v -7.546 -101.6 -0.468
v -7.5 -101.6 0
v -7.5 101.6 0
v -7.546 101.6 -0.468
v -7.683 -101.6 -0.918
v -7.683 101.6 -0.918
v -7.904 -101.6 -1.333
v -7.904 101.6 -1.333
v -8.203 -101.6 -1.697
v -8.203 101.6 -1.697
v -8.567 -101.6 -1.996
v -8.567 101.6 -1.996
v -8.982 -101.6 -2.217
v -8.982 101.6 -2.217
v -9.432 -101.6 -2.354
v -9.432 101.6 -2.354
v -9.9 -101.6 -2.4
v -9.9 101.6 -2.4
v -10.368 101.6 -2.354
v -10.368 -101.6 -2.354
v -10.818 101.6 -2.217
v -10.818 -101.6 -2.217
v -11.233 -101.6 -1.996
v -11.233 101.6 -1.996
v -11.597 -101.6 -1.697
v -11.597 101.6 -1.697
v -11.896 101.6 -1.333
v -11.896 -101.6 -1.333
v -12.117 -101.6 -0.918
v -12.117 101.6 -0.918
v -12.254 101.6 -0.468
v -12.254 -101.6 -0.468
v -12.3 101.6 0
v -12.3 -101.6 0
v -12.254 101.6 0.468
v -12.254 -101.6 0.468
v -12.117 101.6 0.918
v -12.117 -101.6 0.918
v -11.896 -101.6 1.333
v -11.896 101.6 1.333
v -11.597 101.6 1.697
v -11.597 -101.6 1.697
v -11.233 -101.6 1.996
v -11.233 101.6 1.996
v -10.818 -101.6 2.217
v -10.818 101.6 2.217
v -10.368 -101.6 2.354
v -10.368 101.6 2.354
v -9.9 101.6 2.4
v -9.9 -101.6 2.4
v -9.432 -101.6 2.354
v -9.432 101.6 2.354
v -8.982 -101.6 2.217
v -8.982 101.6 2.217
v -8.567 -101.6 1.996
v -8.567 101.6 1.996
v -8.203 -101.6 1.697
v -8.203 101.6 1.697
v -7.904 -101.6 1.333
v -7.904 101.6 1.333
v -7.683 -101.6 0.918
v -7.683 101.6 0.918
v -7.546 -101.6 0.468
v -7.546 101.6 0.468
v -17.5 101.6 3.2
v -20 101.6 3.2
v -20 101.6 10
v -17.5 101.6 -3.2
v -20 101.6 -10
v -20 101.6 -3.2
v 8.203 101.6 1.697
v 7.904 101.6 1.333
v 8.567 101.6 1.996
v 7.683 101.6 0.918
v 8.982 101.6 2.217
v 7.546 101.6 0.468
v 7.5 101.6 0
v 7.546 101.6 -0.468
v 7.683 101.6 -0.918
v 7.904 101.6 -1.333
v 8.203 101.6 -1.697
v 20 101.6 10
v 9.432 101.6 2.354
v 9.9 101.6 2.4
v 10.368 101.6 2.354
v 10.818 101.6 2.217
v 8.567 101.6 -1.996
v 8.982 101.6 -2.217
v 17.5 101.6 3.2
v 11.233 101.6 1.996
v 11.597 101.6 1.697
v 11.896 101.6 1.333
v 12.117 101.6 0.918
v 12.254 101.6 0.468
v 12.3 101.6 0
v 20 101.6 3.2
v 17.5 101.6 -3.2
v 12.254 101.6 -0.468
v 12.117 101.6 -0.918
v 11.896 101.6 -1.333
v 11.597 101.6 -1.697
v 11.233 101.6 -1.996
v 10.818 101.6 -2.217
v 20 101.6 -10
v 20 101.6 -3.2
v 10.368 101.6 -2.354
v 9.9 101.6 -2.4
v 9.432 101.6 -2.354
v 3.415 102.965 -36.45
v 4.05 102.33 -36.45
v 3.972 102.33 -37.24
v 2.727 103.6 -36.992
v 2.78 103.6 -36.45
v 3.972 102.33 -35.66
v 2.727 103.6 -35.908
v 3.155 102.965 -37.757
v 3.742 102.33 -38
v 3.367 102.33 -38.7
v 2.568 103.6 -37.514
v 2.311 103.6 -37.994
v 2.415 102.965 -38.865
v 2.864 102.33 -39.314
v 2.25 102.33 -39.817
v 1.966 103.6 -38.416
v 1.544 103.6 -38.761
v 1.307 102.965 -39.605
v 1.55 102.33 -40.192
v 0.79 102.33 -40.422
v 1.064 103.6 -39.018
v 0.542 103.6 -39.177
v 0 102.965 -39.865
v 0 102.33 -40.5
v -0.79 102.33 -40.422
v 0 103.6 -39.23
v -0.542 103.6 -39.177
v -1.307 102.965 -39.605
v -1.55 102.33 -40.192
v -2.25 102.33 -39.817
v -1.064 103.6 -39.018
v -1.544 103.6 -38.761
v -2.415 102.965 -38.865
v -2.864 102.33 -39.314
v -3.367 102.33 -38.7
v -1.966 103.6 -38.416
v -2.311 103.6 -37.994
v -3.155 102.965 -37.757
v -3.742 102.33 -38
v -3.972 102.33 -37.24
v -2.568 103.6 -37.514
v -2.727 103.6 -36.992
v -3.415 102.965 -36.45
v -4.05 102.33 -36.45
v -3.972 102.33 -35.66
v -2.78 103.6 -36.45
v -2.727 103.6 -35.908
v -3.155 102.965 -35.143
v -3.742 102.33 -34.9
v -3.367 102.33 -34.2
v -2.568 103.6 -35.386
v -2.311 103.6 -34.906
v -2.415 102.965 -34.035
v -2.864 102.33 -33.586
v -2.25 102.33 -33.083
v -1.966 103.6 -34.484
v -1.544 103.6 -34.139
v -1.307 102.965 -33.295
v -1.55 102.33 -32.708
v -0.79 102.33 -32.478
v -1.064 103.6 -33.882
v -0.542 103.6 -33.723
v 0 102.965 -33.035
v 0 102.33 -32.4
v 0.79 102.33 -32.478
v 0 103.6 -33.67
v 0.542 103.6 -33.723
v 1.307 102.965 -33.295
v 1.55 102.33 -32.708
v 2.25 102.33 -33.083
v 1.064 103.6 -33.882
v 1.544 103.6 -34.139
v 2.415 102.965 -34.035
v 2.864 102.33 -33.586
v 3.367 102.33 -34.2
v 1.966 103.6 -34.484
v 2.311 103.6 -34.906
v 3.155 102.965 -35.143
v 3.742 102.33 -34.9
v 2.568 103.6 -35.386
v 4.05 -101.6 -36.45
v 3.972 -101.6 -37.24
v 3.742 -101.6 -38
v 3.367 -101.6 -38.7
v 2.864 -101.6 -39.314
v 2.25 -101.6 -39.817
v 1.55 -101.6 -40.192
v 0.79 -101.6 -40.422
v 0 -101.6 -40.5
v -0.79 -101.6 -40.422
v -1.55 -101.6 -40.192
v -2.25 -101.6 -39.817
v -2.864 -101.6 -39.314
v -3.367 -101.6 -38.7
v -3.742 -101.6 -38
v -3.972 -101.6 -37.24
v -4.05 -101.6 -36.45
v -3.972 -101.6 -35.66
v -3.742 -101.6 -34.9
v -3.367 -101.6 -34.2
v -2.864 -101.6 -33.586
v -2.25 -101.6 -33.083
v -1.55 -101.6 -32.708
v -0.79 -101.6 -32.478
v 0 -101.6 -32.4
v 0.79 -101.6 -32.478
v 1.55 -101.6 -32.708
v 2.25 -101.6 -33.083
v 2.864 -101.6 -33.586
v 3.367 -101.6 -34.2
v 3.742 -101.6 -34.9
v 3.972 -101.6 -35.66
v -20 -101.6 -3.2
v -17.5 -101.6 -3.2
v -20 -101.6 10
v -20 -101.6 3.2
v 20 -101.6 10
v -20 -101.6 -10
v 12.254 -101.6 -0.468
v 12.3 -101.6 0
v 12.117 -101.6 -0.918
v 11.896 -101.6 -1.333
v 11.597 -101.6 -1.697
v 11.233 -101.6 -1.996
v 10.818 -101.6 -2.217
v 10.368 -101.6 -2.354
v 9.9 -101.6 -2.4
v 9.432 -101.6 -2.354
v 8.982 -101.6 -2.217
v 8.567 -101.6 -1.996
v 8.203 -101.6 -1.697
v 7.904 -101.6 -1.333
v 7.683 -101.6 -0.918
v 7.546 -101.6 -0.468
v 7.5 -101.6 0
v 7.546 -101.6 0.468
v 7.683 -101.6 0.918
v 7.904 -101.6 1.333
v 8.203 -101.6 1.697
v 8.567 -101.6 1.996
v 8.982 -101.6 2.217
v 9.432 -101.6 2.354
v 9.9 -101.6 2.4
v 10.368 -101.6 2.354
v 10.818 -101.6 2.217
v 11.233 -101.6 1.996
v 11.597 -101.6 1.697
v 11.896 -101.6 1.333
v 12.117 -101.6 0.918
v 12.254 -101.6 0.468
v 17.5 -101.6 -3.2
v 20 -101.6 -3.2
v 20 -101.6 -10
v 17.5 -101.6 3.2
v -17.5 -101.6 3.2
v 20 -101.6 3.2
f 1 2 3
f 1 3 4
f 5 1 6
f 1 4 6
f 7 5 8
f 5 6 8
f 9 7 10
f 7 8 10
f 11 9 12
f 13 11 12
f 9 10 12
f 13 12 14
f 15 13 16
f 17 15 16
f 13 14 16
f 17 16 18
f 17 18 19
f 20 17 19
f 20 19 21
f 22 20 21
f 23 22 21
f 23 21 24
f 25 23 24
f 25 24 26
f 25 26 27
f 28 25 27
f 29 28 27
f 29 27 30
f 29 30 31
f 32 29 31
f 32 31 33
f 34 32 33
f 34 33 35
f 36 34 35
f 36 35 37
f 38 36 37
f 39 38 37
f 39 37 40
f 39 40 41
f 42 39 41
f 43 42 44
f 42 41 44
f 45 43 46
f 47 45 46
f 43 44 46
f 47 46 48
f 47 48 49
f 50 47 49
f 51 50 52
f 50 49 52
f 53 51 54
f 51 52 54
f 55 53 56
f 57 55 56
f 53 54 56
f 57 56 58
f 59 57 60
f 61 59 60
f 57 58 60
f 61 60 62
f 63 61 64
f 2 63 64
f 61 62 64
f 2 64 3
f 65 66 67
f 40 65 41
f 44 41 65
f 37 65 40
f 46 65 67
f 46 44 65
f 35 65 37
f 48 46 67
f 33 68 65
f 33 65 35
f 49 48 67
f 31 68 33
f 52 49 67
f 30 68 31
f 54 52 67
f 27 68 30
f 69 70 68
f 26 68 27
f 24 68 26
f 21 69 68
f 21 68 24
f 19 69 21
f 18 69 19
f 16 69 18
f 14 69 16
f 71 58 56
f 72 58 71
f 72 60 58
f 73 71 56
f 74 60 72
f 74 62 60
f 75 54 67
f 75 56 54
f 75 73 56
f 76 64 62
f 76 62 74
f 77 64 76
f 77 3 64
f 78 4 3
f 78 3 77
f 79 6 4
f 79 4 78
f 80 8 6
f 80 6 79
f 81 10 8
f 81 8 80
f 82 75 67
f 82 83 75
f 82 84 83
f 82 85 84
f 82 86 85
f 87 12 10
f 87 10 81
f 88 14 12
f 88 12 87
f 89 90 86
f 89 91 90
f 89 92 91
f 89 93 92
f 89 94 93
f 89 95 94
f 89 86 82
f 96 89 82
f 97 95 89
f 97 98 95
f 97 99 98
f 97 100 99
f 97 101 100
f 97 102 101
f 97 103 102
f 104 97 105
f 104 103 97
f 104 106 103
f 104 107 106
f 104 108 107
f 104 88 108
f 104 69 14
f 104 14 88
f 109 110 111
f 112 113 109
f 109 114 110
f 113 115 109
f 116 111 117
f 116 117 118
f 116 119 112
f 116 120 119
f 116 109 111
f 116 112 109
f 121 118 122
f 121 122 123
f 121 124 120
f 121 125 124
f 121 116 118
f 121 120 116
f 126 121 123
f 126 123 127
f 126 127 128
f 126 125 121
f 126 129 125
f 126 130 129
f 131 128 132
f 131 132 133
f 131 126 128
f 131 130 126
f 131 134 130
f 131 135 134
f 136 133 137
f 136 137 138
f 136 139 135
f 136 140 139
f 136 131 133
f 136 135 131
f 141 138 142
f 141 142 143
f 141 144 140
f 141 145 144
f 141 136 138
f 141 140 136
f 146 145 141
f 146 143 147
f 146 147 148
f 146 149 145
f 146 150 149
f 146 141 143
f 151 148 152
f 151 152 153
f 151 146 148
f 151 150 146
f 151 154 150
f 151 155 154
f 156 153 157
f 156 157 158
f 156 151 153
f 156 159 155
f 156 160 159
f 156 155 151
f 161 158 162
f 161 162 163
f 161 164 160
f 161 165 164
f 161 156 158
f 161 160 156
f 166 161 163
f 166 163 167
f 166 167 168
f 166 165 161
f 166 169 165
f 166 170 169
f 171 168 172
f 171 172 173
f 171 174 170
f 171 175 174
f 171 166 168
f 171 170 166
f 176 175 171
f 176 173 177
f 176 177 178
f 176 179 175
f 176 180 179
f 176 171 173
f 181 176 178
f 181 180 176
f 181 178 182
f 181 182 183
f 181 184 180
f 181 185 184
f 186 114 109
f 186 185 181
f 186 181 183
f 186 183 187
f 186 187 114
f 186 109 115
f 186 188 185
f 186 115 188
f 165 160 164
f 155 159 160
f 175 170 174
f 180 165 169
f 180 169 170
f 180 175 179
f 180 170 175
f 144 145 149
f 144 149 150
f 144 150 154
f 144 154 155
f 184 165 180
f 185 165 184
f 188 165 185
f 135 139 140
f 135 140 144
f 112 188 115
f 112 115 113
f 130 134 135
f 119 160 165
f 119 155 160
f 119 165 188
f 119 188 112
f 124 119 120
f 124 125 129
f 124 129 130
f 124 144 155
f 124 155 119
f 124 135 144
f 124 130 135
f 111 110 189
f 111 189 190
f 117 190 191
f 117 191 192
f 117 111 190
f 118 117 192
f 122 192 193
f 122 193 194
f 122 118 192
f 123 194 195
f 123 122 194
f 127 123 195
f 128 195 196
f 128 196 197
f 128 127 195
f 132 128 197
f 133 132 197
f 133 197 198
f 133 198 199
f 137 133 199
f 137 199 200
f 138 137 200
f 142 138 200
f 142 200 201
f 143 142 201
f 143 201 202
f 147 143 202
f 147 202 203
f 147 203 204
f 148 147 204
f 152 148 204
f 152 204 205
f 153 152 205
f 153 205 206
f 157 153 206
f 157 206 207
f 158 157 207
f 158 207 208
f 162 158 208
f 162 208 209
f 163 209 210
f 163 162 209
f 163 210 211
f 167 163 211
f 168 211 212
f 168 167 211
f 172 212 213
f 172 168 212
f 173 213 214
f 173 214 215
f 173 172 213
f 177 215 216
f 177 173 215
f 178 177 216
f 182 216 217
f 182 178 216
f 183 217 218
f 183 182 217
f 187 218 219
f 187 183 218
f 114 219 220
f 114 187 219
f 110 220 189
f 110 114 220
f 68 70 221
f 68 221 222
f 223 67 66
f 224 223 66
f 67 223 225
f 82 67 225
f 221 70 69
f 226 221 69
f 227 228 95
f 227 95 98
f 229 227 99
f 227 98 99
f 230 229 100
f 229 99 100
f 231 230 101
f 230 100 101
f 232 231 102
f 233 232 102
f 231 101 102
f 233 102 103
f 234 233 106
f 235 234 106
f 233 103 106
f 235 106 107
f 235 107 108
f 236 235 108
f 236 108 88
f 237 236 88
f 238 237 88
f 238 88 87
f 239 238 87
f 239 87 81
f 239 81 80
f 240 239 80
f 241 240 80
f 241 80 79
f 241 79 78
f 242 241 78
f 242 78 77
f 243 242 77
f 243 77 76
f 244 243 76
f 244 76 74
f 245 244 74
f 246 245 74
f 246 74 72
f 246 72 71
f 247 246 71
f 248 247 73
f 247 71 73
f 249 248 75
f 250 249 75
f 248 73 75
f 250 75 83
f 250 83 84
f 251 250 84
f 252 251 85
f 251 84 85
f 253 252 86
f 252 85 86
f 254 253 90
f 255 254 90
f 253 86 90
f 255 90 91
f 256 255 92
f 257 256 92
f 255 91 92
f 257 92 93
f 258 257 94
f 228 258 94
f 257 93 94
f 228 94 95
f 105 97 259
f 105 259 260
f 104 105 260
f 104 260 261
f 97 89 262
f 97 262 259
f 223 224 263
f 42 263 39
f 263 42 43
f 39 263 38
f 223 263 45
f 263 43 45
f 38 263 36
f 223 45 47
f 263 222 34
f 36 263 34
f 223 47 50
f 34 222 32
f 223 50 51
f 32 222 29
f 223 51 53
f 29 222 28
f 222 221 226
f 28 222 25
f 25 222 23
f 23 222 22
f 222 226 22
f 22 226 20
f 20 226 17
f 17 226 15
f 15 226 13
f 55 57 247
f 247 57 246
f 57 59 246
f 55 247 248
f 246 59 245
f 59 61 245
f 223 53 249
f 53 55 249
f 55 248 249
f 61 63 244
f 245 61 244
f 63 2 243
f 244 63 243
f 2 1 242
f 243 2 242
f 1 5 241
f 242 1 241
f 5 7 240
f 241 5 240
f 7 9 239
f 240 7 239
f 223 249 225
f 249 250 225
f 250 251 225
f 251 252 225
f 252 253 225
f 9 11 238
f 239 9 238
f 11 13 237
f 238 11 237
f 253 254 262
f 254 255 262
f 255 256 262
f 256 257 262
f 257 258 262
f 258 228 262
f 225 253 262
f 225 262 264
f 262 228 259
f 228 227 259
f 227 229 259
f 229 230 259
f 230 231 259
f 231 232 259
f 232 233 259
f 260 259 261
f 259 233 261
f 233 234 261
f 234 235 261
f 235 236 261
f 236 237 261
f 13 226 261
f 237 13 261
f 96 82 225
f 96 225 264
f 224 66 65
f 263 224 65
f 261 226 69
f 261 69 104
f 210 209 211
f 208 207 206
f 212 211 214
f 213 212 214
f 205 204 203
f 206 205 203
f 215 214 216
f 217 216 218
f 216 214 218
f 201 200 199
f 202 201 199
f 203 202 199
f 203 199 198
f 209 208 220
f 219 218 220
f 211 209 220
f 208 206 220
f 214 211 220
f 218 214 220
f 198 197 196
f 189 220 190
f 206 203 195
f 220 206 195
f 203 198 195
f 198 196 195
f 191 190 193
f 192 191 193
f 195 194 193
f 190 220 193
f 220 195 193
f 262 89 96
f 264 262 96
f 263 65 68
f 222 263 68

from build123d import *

# Parameters (mm, degrees)
SKETCH1_W                = 40
SKETCH1_H                = 20
BOSS_EXTRUDE1_DEPTH      = 101.6
SKETCH2_W                = 2.5
SKETCH2_H                = 6.4
CUT_EXTRUDE1_DEPTH       = 204.2
SKETCH3_R                = 2.4
CUT_EXTRUDE2_DEPTH       = 204.2
SKETCH4_R                = 4.05
BOSS_EXTRUDE2_DEPTH      = 2
BOSS_EXTRUDE2_DEPTH_BACK = 203.2
CHAMFER1_SIZE            = 1.27


with BuildPart() as part:
    # Sketch1 → Boss-Extrude1 (new body, symmetric)
    with BuildSketch(Plane(origin=(0, 0, 0), x_dir=(1, 0, 0), z_dir=(0, 1, 0))):
        Rectangle(SKETCH1_W, SKETCH1_H)
    extrude(amount=BOSS_EXTRUDE1_DEPTH, both=True)

    # Sketch2 → Cut-Extrude1 (cut, through all)
    with BuildSketch(Plane(origin=(0, 101.6, 0), x_dir=(1, 0, 0), z_dir=(0, 1, 0))):
        with Locations((-18.75, 0)):
            Rectangle(SKETCH2_W, SKETCH2_H)
        with Locations((18.75, 0)):
            Rectangle(SKETCH2_W, SKETCH2_H)
    extrude(amount=-CUT_EXTRUDE1_DEPTH, mode=Mode.SUBTRACT)

    # Sketch3 → Cut-Extrude2 (cut, through all)
    with BuildSketch(Plane(origin=(0, 101.6, 0), x_dir=(1, 0, 0), z_dir=(0, 1, 0))):
        with Locations((-9.9, 0)):
            Circle(SKETCH3_R)
        with Locations((9.9, 0)):
            Circle(SKETCH3_R)
    extrude(amount=-CUT_EXTRUDE2_DEPTH, mode=Mode.SUBTRACT)


with BuildPart() as body_2:
    # Sketch4 → Boss-Extrude2 (new body, two sides)
    with BuildSketch(Plane(origin=(0, 101.6, 0), x_dir=(1, 0, 0), z_dir=(0, 1, 0))) as boss_extrude2_sk:
        with Locations((0, 36.45)):
            Circle(SKETCH4_R)
    extrude(amount=BOSS_EXTRUDE2_DEPTH)
    extrude(boss_extrude2_sk.sketch, amount=-BOSS_EXTRUDE2_DEPTH_BACK)

    # Chamfer1
    chamfer1_edges = [body_2.edges().sort_by_distance(p)[0] for p in [
        (-4.05, 103.6, -36.45),
    ]]
    chamfer(chamfer1_edges, length=CHAMFER1_SIZE)


solid = Compound([part.part, body_2.part])
